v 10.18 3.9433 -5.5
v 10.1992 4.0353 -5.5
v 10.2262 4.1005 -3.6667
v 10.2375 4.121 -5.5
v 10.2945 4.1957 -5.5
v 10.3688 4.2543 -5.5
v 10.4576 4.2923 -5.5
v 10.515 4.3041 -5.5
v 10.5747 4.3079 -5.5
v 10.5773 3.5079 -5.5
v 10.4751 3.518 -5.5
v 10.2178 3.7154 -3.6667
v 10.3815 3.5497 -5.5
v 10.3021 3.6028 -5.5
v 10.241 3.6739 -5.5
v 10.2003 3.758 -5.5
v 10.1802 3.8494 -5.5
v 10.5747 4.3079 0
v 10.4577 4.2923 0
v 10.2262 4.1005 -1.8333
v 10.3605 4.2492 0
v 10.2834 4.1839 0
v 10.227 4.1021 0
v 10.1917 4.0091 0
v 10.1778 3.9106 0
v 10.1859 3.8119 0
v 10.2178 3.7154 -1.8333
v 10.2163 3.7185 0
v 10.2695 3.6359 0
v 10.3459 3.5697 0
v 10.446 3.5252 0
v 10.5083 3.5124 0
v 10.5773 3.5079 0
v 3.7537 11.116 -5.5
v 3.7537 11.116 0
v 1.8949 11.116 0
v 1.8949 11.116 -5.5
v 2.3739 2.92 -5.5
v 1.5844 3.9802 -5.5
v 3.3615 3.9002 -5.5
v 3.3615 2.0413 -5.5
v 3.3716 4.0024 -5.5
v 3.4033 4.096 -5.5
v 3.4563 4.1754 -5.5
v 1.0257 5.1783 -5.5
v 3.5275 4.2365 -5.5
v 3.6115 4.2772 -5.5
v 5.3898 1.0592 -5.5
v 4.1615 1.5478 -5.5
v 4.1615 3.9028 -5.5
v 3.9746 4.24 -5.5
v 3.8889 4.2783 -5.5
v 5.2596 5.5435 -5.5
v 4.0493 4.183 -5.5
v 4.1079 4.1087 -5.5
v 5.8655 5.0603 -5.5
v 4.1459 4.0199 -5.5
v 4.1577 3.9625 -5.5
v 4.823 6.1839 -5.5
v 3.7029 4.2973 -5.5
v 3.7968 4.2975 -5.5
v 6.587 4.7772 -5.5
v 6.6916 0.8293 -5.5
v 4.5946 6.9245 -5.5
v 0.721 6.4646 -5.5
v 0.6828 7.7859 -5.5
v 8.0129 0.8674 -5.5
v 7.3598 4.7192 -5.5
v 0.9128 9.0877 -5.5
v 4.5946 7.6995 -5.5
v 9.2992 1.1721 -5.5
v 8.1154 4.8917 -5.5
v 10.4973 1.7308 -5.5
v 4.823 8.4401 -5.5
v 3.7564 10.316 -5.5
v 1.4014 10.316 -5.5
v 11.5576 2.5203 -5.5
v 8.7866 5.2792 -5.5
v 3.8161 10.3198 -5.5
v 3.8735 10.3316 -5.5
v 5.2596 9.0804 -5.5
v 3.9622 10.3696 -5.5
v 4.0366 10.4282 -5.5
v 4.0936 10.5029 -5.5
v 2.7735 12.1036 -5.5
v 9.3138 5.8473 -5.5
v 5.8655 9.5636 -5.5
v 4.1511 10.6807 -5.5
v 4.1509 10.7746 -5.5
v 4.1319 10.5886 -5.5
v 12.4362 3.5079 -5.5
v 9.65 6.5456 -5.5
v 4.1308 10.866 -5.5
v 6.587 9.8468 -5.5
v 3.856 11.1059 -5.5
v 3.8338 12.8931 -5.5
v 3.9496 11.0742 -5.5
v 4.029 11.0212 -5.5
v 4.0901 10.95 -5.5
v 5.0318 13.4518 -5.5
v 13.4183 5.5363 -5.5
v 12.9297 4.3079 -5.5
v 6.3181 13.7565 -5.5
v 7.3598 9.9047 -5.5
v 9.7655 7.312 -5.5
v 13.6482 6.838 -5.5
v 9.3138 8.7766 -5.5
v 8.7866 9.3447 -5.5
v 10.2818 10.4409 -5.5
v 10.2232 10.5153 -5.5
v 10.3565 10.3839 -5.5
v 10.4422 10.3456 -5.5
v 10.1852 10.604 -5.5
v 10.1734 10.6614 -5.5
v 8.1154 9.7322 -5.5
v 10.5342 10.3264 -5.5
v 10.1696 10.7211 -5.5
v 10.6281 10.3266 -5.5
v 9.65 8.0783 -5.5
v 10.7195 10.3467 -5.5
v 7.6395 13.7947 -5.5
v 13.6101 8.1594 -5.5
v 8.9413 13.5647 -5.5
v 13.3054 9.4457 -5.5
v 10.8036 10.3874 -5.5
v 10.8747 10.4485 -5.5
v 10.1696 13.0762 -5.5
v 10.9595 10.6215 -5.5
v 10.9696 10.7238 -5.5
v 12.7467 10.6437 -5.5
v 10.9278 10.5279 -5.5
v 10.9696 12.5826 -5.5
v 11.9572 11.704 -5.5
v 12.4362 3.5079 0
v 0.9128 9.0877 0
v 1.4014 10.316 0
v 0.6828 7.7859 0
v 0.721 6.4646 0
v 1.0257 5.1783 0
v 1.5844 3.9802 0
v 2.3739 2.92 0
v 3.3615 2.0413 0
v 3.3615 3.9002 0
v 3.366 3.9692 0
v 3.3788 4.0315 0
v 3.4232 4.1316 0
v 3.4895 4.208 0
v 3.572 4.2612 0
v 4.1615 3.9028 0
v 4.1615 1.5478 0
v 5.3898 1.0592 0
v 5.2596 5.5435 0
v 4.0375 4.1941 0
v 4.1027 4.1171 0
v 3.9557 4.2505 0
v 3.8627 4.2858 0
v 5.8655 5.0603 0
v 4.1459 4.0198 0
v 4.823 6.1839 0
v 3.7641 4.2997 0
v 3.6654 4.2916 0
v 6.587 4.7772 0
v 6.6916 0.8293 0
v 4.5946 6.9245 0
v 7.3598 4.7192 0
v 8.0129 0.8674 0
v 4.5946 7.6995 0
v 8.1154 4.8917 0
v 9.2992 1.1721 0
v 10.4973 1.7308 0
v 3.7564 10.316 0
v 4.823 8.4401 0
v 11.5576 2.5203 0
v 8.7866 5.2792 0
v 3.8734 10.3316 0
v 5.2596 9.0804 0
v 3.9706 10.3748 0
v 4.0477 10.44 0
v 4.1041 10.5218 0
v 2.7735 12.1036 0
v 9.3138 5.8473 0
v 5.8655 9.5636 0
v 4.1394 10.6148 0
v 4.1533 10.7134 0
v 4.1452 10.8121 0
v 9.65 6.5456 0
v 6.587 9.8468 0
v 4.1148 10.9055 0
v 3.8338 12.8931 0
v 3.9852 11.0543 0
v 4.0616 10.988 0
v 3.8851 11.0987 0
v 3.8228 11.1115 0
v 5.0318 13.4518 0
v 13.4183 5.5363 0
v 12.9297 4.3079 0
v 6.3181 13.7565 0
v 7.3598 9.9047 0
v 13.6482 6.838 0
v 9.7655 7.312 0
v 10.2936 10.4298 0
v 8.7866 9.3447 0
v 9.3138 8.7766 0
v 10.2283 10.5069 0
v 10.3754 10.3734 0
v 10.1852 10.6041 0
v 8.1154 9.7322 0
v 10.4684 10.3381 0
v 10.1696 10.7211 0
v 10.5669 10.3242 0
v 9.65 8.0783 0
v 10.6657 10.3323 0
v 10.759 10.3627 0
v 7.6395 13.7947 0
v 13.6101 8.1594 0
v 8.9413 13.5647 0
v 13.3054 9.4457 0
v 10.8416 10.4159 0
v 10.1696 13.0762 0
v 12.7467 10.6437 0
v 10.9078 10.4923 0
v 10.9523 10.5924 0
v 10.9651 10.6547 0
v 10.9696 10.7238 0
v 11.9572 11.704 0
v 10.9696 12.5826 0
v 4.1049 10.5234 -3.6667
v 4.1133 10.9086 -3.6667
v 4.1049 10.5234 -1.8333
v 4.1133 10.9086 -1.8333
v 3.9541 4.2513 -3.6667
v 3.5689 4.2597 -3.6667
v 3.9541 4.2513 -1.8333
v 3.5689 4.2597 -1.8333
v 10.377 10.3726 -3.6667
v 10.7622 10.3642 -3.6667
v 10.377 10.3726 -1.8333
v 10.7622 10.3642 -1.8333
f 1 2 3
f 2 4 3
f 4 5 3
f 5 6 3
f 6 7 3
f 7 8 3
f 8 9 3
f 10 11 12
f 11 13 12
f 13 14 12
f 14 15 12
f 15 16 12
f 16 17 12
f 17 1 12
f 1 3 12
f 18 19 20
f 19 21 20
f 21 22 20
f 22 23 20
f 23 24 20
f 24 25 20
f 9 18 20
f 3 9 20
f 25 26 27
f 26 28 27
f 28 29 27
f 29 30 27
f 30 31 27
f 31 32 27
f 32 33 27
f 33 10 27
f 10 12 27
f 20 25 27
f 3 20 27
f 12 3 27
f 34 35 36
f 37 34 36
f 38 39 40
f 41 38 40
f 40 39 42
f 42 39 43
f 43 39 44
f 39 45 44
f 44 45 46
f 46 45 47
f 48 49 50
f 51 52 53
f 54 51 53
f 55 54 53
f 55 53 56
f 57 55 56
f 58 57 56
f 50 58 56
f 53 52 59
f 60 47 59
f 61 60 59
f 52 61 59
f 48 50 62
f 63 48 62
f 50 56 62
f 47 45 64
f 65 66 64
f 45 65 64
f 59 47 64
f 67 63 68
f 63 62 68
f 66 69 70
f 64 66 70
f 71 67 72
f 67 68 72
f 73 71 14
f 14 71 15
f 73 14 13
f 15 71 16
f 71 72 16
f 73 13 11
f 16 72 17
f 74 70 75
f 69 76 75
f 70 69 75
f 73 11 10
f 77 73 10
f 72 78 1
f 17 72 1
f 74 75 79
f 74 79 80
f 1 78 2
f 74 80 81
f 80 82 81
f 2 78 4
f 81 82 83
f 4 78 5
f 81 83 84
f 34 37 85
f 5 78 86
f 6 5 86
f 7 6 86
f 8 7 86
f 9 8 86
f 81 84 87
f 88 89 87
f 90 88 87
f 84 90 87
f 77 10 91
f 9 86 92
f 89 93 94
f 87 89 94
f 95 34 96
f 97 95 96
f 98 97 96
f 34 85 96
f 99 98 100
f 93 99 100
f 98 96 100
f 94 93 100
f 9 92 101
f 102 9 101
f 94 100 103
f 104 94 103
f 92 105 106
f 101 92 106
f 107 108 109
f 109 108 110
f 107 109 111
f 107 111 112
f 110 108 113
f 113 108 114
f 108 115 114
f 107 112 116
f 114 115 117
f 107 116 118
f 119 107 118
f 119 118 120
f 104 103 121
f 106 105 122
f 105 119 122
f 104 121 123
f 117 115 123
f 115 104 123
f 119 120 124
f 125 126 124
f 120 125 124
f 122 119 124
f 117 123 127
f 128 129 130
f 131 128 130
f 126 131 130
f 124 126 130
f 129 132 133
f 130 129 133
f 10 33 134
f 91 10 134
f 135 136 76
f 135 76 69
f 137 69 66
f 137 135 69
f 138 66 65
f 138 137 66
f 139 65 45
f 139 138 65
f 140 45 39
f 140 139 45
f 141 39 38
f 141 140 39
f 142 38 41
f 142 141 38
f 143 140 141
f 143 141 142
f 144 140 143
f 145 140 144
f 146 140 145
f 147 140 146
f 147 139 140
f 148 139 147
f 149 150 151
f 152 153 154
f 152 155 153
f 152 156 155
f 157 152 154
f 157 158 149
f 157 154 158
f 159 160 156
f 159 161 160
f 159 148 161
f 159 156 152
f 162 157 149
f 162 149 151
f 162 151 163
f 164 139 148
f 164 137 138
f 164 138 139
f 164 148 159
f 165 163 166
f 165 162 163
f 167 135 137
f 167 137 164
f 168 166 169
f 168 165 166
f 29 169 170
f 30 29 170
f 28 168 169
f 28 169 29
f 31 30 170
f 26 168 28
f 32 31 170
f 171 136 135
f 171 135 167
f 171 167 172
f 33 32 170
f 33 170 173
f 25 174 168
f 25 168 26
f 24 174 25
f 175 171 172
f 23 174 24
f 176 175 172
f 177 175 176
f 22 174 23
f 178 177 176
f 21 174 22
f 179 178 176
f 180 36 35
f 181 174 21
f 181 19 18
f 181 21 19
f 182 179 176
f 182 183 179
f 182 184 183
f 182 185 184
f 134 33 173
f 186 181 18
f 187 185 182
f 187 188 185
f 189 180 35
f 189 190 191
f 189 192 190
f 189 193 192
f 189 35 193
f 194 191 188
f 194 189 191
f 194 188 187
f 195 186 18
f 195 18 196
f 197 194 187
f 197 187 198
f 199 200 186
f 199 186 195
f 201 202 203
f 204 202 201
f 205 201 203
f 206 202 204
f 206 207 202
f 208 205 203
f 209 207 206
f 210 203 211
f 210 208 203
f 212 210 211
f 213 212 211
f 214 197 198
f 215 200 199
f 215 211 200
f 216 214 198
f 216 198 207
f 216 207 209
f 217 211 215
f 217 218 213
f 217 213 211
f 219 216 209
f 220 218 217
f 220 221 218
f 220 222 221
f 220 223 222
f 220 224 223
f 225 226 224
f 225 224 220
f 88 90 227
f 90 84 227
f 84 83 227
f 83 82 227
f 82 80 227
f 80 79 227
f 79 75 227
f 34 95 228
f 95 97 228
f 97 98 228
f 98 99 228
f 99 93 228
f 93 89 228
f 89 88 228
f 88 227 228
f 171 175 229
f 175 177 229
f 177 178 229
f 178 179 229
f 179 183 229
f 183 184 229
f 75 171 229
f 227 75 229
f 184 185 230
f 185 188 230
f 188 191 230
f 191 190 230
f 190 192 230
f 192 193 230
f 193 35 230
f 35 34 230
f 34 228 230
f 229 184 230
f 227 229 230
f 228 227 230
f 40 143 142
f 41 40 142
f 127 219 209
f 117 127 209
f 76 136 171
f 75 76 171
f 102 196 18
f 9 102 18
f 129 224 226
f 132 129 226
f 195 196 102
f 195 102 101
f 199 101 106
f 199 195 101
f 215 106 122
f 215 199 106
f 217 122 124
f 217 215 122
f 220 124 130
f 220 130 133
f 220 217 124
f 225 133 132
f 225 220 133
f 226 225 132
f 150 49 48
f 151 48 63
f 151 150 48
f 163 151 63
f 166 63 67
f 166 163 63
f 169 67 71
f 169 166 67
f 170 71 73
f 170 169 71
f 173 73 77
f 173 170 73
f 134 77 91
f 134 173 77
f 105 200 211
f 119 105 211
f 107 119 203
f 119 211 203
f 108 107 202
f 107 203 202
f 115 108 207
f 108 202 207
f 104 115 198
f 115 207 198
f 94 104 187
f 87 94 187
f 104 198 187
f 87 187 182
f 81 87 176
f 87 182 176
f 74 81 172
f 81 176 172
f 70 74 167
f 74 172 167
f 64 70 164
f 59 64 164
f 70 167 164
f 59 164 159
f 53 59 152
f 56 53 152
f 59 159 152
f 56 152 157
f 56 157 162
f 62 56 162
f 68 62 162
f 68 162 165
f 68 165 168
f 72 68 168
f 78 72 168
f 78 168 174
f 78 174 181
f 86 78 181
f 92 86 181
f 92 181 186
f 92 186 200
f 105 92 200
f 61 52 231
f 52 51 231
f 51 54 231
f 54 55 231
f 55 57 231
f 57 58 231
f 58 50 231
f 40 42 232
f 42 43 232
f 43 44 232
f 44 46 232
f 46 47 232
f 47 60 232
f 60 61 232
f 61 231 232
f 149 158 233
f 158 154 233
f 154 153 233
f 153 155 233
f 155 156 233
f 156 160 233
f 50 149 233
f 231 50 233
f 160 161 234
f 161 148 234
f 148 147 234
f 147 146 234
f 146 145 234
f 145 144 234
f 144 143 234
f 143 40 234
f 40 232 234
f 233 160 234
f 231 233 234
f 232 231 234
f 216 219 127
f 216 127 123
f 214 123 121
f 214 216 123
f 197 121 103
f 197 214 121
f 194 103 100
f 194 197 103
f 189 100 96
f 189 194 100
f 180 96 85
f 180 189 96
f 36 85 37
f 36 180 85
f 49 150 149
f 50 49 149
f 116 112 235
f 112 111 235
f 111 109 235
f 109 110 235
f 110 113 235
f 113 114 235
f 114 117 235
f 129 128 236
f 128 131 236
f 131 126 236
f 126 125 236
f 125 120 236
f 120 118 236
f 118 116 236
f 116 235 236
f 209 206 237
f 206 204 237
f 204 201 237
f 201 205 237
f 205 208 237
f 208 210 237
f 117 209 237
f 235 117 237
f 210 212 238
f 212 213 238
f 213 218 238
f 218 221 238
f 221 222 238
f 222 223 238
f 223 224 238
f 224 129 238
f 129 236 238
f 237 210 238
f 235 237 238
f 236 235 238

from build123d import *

# Parameters (mm, degrees)
SKETCH2_R           = 6.5
BOSS_EXTRUDE2_DEPTH = 5.5
SKETCH1_R           = 2.6
CUT_EXTRUDE1_DEPTH  = 21.193250236


with BuildPart() as part:
    # Sketch2 → Boss-Extrude2 (new body)
    with BuildSketch(Plane.XY):
        with Locations((7.165538907, 7.311965881)):
            Circle(SKETCH2_R)
    extrude(amount=-BOSS_EXTRUDE2_DEPTH)

    # Sketch1 → Cut-Extrude1 (cut, through all)
    with BuildSketch(Plane.XY):
        with Locations((7.165538907, 7.311965881)):
            Circle(SKETCH1_R)
        with BuildLine():
            Line((10.969559419, 10.723771247), (10.969559419, 13.011721187))
            add(Edge.make_bspline(
                [(10.969559419, 13.011721187), (10.958646548, 13.475622363), (10.162270372, 13.509138157), (10.169559419, 13.215491328)],
                knots=[0, 0, 0, 0, 1, 1, 1, 1], degree=3))
            Line((10.169559419, 13.215491328), (10.169559419, 10.721114654))
            add(Edge.make_bspline(
                [(10.169559419, 10.721114654), (10.169559419, 10.211921076), (10.969559419, 10.170868336), (10.969559419, 10.723771247)],
                knots=[0, 0, 0, 0, 1, 1, 1, 1], degree=3))
        make_face()
        with BuildLine():
            Line((13.069064354, 4.307945368), (10.57468768, 4.307945368))
            add(Edge.make_bspline(
                [(10.57468768, 4.307945368), (10.065494102, 4.307945368), (10.024441362, 3.507945368), (10.577344274, 3.507945368)],
                knots=[0, 0, 0, 0, 1, 1, 1, 1], degree=3))
            Line((10.577344274, 3.507945368), (12.865294213, 3.507945368))
            add(Edge.make_bspline(
                [(12.865294213, 3.507945368), (13.329195389, 3.518858239), (13.362711183, 4.315234416), (13.069064354, 4.307945368)],
                knots=[0, 0, 0, 0, 1, 1, 1, 1], degree=3))
        make_face()
        with BuildLine():
            Line((4.161518395, 1.408440433), (4.161518395, 3.902817107))
            add(Edge.make_bspline(
                [(4.161518395, 3.902817107), (4.161518395, 4.412010686), (3.361518395, 4.453063426), (3.361518395, 3.900160514)],
                knots=[0, 0, 0, 0, 1, 1, 1, 1], degree=3))
            Line((3.361518395, 3.900160514), (3.361518395, 1.612210574))
            add(Edge.make_bspline(
                [(3.361518395, 1.612210574), (3.372431266, 1.148309399), (4.168807442, 1.114793605), (4.161518395, 1.408440433)],
                knots=[0, 0, 0, 0, 1, 1, 1, 1], degree=3))
        make_face()
        with BuildLine():
            Line((1.26201346, 10.315986393), (3.756390133, 10.315986393))
            add(Edge.make_bspline(
                [(3.756390133, 10.315986393), (4.265583712, 10.315986393), (4.306636452, 11.115986393), (3.75373354, 11.115986393)],
                knots=[0, 0, 0, 0, 1, 1, 1, 1], degree=3))
            Line((3.75373354, 11.115986393), (1.465783601, 11.115986393))
            add(Edge.make_bspline(
                [(1.465783601, 11.115986393), (1.001882425, 11.105073522), (0.968366631, 10.308697346), (1.26201346, 10.315986393)],
                knots=[0, 0, 0, 0, 1, 1, 1, 1], degree=3))
        make_face()
    extrude(amount=-CUT_EXTRUDE1_DEPTH, mode=Mode.SUBTRACT)


solid = part.part
